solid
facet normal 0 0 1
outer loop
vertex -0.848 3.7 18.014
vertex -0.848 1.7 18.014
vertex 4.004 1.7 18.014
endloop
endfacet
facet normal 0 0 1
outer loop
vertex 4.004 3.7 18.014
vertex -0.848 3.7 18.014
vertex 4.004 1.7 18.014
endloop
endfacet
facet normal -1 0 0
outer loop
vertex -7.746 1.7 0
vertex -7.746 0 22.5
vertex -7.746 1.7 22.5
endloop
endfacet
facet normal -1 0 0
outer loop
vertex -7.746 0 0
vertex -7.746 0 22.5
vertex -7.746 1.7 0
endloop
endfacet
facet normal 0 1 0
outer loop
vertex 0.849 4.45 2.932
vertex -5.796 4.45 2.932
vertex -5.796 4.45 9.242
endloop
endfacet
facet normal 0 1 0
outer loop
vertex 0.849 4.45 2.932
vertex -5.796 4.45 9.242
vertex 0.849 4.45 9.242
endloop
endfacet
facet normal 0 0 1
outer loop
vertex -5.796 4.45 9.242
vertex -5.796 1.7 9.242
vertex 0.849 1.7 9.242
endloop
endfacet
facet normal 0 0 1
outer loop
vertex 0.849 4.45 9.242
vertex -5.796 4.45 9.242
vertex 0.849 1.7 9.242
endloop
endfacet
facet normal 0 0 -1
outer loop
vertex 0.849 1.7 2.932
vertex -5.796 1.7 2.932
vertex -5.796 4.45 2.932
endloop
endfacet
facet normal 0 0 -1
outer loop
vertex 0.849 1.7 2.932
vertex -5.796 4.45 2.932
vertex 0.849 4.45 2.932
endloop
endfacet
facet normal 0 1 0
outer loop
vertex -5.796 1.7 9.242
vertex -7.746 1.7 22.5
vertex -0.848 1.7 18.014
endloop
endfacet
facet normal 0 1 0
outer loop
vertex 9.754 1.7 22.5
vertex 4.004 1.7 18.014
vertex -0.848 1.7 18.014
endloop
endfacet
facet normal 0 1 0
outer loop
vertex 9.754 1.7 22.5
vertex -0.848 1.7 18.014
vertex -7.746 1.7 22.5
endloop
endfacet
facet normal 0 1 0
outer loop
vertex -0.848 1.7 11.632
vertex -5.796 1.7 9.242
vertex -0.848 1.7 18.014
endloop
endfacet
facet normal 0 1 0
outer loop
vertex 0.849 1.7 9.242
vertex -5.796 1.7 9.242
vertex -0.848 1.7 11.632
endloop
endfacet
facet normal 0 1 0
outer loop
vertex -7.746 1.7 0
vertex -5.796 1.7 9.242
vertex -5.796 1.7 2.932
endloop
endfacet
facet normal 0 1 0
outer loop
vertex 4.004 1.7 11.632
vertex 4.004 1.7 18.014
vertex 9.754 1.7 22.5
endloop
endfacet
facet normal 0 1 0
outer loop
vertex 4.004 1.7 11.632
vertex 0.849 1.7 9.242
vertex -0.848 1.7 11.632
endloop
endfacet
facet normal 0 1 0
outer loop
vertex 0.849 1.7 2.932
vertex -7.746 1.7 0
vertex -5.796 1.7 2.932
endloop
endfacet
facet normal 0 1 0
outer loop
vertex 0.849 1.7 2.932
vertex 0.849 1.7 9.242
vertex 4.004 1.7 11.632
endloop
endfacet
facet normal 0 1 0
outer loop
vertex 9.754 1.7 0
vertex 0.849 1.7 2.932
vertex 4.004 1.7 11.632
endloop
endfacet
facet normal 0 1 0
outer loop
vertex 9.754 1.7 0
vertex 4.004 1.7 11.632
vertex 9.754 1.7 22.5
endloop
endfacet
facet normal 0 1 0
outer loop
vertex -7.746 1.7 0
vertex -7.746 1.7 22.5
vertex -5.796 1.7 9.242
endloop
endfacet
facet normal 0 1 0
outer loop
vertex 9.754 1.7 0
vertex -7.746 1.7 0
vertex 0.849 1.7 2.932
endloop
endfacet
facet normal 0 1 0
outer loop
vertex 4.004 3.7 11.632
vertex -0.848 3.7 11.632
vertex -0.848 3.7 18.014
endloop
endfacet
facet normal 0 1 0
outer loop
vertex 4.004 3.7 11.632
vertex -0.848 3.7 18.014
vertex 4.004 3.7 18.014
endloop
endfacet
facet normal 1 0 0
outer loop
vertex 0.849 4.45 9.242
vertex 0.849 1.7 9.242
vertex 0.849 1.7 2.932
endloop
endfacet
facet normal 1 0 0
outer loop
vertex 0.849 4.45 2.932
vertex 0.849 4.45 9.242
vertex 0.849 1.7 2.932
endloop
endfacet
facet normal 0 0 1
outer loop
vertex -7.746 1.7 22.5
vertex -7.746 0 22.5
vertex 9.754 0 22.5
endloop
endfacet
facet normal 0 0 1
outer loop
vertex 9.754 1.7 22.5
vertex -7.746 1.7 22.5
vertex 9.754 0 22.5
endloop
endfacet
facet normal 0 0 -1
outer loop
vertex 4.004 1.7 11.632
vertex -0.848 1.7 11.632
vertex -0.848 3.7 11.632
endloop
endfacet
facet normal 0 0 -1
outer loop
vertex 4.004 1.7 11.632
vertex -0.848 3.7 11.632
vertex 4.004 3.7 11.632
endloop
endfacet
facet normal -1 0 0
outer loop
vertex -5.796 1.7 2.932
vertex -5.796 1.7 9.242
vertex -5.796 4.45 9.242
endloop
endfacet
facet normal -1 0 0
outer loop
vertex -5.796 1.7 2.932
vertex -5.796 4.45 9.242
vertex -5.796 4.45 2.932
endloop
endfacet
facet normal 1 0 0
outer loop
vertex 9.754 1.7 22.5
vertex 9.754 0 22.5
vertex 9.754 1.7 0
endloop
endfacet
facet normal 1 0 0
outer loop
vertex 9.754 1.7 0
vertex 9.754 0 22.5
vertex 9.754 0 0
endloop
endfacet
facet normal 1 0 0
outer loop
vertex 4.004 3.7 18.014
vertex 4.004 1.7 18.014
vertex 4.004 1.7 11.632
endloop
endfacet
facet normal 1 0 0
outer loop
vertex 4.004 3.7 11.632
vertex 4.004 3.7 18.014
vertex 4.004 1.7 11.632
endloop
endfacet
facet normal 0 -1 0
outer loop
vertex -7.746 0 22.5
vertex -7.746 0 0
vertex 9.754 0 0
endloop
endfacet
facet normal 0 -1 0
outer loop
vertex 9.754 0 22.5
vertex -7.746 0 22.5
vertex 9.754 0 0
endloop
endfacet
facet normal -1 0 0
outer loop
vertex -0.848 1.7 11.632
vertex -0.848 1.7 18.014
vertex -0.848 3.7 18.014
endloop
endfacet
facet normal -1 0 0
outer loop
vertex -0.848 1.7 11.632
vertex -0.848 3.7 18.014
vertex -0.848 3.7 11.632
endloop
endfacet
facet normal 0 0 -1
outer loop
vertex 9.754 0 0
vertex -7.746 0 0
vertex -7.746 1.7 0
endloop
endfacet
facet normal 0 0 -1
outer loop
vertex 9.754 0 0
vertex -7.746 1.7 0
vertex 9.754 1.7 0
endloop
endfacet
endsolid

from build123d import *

# Parameters (mm, degrees)
SKETCH1_W           = 17.5
SKETCH1_H           = 22.5
BOSS_EXTRUDE1_DEPTH = 1.7
SKETCH2_W           = 6.644971707
SKETCH2_H           = 6.310332844
BOSS_EXTRUDE2_DEPTH = 2.75
SKETCH3_W           = 4.852263512
SKETCH3_H           = 6.382041172
BOSS_EXTRUDE3_DEPTH = 2


with BuildPart() as part:
    # Sketch1 → Boss-Extrude1 (new body)
    with BuildSketch(Plane(origin=(0, 0, 0), x_dir=(1, 0, 0), z_dir=(0, 1, 0))):
        with Locations((1.003989362, -11.25)):
            Rectangle(SKETCH1_W, SKETCH1_H)
    extrude(amount=BOSS_EXTRUDE1_DEPTH)

    # Sketch2 → Boss-Extrude2 (add)
    with BuildSketch(Plane(origin=(0, 1.7, 0), x_dir=(1, 0, 0), z_dir=(0, 1, 0))):
        with Locations((-2.473864536, -6.0870004)):
            Rectangle(SKETCH2_W, SKETCH2_H)
    extrude(amount=BOSS_EXTRUDE2_DEPTH)

    # Sketch3 → Boss-Extrude3 (add)
    with BuildSketch(Plane(origin=(0, 1.7, 0), x_dir=(1, 0, 0), z_dir=(0, 1, 0))):
        with Locations((1.577655984, -14.823465001)):
            Rectangle(SKETCH3_W, SKETCH3_H)
    extrude(amount=BOSS_EXTRUDE3_DEPTH)


solid = part.part
